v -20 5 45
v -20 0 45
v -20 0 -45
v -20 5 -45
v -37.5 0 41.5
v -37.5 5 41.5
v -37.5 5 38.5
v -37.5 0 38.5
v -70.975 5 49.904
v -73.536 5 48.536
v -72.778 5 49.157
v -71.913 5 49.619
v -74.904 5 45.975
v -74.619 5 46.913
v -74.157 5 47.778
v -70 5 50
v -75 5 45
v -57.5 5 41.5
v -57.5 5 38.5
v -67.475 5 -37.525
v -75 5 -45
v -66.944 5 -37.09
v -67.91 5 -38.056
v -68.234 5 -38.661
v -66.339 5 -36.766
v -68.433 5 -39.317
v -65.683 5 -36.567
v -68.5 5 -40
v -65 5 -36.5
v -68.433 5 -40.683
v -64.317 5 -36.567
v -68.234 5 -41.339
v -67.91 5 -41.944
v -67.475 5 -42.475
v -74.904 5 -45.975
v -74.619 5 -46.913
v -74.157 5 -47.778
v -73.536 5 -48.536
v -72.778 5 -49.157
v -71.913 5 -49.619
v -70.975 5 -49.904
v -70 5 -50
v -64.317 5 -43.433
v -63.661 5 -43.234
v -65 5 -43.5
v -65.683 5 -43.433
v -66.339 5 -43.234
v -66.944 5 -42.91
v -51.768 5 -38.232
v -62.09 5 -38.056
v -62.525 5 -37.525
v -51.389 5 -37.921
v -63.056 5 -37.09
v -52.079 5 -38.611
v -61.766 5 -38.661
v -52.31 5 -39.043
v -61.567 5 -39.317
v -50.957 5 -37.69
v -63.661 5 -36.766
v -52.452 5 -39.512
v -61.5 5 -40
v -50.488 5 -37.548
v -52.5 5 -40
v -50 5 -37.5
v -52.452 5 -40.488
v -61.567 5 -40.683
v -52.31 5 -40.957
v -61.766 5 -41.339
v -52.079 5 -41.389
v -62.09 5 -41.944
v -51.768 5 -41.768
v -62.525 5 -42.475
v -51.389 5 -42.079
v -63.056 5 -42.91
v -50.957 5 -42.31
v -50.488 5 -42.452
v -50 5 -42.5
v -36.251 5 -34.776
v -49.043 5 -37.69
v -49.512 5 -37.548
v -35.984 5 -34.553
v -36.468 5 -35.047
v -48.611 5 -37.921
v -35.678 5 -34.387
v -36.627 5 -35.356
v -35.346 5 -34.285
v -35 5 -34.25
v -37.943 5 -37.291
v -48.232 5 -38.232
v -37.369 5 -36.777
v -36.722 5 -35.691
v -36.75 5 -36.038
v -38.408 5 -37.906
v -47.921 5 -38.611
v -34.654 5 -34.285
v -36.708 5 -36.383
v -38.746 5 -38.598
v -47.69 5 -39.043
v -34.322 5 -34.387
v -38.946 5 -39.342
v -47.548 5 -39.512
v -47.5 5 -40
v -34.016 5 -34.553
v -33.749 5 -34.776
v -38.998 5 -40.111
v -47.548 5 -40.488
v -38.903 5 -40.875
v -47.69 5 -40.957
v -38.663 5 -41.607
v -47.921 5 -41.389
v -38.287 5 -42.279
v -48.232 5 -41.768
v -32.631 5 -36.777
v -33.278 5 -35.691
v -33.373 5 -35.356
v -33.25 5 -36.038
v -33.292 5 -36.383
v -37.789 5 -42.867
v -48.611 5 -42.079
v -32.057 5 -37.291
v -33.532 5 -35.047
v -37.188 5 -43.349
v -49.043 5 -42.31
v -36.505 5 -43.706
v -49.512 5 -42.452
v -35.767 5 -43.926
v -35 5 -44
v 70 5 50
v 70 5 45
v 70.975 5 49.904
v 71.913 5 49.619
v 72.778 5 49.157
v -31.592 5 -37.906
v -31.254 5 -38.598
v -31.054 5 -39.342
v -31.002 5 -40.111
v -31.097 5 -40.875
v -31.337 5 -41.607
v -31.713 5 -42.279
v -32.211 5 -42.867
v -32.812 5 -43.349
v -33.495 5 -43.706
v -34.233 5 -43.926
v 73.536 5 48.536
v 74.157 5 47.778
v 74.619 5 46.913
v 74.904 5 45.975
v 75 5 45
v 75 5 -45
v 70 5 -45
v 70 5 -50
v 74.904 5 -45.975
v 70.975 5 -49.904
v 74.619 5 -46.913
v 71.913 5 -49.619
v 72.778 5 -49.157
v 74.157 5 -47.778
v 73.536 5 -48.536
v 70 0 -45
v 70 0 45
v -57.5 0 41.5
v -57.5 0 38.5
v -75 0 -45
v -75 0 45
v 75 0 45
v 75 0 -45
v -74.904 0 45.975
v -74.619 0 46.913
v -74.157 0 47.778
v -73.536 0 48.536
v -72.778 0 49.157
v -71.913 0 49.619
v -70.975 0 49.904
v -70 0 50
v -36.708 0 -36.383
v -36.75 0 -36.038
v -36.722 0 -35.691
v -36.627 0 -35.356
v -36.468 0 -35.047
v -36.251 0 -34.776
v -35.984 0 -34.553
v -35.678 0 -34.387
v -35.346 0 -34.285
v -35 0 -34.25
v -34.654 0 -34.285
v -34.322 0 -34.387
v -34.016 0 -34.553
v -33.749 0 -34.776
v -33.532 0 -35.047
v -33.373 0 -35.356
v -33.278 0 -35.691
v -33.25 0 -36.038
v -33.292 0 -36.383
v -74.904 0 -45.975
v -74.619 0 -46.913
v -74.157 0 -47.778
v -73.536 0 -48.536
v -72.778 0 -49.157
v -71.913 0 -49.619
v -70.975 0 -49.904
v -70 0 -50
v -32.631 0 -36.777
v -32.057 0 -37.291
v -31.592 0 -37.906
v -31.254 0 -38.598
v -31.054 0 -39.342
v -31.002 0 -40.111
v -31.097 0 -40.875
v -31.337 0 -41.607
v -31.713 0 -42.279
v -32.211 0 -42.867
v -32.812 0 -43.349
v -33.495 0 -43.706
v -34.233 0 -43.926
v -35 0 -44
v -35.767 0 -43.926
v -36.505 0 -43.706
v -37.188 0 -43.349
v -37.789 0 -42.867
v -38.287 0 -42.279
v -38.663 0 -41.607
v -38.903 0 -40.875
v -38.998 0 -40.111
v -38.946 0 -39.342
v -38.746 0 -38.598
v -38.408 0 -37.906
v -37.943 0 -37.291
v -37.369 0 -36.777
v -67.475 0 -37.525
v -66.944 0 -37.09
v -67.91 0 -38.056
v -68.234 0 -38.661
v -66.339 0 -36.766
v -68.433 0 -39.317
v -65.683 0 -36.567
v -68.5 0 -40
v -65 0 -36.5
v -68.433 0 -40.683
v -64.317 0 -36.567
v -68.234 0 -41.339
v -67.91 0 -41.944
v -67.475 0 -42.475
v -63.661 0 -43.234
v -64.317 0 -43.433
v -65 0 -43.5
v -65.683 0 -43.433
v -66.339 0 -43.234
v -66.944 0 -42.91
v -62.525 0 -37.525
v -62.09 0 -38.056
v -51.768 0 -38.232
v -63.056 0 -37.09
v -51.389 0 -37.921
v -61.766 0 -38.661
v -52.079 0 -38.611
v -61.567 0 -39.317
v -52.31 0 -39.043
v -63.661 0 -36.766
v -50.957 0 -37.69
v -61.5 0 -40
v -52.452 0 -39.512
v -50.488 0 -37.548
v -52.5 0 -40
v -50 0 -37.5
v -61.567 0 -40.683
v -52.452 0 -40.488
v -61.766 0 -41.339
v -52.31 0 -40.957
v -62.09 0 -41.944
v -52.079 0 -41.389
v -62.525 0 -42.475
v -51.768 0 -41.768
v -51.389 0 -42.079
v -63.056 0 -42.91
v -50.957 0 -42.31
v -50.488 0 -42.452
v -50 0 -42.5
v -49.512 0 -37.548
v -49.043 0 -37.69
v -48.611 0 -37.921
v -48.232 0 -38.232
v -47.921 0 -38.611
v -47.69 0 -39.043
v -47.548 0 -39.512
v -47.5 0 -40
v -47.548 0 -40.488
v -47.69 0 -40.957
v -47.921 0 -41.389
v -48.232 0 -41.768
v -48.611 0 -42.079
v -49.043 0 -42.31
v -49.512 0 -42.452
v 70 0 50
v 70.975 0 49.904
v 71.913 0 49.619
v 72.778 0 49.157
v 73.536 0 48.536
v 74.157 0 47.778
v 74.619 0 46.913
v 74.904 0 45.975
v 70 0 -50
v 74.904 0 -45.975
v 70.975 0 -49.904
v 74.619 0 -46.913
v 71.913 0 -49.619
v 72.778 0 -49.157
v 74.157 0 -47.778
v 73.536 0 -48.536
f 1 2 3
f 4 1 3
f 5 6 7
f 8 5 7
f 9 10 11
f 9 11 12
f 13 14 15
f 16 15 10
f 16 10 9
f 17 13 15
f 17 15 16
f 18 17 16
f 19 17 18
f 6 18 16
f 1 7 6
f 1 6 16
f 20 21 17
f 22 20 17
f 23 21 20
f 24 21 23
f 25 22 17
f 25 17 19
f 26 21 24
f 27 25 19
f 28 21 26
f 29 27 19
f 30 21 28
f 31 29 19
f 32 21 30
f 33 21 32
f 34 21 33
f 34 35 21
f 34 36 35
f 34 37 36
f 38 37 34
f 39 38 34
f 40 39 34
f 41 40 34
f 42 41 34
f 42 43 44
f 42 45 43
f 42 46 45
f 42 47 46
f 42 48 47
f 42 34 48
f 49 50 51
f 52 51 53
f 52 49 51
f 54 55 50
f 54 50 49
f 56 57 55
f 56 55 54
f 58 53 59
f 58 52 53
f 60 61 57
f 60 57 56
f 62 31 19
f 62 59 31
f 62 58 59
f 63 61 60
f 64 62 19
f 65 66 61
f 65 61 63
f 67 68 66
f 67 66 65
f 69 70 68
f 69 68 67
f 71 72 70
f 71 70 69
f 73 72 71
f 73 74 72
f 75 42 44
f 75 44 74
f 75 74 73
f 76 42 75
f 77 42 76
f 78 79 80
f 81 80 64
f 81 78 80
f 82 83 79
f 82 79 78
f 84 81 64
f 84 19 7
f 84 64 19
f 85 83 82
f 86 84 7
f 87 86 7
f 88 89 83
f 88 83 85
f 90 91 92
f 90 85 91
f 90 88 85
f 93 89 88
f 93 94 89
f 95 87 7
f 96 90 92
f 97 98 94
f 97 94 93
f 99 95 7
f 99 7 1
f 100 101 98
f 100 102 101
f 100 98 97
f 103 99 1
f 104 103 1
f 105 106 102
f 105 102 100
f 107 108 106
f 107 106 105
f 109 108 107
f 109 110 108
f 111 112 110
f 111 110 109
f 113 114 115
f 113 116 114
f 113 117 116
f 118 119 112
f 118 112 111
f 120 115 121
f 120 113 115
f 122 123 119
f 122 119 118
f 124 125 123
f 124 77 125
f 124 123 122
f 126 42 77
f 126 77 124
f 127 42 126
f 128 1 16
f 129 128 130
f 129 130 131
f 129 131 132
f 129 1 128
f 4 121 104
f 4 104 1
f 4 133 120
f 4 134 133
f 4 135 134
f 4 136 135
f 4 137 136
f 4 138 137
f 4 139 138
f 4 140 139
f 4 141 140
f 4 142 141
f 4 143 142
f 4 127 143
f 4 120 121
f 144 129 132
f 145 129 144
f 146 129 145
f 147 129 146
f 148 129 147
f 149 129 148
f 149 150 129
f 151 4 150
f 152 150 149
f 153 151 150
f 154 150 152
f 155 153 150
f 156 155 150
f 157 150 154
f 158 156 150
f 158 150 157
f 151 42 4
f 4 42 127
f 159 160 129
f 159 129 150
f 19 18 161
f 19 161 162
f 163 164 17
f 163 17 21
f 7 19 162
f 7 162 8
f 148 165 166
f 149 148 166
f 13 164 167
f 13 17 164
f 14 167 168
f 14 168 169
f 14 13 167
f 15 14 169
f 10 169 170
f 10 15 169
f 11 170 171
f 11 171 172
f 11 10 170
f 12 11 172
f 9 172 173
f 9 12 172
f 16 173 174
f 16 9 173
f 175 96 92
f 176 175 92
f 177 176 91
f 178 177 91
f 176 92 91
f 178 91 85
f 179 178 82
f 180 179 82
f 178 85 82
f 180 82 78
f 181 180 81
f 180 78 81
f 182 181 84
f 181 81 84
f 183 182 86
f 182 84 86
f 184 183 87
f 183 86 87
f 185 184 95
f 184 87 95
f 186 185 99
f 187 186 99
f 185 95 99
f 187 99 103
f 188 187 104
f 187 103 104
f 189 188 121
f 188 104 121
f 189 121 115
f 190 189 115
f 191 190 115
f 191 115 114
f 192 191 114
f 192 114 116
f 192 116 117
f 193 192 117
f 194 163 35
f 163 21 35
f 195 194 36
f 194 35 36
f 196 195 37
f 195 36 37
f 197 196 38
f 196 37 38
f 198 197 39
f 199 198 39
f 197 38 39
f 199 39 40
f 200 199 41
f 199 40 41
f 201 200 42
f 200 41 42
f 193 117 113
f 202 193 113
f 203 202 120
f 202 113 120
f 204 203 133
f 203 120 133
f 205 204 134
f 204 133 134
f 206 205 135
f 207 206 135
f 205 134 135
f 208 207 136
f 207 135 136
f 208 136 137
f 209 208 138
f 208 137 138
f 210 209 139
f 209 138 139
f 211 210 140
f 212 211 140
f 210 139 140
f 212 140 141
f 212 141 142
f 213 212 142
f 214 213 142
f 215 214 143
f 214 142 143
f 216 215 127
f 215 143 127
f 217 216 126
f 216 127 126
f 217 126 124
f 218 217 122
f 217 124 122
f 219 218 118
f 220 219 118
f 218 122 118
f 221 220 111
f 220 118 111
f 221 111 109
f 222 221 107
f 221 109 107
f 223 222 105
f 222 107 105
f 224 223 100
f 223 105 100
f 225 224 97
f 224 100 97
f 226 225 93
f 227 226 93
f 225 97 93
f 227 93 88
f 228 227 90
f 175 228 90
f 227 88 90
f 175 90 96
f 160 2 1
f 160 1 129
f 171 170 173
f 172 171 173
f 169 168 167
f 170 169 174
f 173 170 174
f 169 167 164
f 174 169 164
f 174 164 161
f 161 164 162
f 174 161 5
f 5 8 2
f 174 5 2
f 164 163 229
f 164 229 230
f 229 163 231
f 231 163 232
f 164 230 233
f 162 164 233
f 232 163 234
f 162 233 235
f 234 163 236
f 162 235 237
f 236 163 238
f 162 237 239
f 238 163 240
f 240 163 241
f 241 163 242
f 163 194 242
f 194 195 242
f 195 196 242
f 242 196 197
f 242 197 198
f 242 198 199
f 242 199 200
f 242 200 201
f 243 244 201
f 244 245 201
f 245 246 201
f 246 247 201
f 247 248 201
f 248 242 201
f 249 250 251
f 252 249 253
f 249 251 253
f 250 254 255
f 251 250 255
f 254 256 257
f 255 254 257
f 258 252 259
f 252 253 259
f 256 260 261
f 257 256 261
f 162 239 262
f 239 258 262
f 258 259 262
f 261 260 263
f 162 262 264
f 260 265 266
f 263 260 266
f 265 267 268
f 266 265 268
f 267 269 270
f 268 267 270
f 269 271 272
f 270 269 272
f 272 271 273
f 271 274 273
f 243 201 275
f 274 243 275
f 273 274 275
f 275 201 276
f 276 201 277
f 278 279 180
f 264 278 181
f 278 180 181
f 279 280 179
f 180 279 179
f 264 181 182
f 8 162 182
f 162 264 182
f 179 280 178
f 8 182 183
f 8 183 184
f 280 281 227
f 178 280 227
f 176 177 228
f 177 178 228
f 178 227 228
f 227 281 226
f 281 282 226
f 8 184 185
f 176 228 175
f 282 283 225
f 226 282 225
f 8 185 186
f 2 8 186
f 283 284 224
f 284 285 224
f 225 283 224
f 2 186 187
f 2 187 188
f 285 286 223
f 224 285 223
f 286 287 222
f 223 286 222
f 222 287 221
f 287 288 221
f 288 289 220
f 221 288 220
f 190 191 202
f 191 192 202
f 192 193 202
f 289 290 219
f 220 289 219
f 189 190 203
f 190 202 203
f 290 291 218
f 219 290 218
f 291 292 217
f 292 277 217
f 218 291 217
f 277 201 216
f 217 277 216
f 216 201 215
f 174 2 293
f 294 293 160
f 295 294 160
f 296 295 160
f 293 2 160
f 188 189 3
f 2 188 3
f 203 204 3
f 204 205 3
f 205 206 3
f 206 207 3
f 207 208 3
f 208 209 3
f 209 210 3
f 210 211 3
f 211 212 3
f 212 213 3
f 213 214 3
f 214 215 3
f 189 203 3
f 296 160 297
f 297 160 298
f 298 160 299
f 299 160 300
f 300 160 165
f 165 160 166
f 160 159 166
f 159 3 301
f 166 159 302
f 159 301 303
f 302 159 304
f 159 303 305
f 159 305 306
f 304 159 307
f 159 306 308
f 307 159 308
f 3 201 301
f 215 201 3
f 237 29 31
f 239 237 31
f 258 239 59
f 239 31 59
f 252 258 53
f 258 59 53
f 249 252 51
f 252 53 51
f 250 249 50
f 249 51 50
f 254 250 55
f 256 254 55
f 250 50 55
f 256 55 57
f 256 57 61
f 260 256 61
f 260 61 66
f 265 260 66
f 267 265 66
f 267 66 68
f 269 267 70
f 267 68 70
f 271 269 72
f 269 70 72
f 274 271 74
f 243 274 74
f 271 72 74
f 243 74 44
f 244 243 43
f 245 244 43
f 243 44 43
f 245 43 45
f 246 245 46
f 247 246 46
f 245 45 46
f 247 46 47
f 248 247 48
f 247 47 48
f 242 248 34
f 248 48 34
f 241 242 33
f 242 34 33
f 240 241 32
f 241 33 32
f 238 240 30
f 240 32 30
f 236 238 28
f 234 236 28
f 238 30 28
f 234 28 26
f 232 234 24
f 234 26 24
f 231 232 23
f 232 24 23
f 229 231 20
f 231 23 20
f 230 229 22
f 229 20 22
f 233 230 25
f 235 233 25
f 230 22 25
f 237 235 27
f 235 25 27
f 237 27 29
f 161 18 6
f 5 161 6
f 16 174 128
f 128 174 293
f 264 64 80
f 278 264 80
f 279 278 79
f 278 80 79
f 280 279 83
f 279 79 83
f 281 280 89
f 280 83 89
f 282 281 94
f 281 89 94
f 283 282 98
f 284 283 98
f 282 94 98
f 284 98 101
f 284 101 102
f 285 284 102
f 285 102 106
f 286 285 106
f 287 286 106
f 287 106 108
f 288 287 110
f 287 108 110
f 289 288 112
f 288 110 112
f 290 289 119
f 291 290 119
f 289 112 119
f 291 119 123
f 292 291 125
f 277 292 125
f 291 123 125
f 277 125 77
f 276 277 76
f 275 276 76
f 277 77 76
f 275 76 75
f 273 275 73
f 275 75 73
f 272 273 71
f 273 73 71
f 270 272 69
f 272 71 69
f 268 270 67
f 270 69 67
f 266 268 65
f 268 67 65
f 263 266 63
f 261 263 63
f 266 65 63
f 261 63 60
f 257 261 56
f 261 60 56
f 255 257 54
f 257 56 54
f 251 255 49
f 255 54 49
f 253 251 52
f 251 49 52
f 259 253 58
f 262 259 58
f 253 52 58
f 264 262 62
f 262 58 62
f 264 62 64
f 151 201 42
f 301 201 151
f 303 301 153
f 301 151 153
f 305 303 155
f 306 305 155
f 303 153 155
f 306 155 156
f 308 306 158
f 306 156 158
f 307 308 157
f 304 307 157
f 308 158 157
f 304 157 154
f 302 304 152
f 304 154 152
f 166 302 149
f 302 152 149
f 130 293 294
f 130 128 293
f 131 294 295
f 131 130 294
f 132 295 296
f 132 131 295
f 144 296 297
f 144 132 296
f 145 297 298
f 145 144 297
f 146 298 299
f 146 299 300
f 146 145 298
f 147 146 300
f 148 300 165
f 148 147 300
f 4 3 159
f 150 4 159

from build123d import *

# Parameters (mm, degrees)
SKETCH1_W           = 150
SKETCH1_H           = 100
SKETCH1_W_2         = 90
SKETCH1_H_2         = 90
BOSS_EXTRUDE1_DEPTH = 5
FILLET1_R           = 5
SKETCH2_R           = 3.5
SKETCH2_R_2         = 2.5
SKETCH2_R_3         = 1.75
SKETCH2_R_4         = 4
SKETCH2_W           = 20
SKETCH2_H           = 3
CUT_EXTRUDE3_DEPTH  = 5


with BuildPart() as part:
    # Sketch1 → Boss-Extrude1 (new body)
    with BuildSketch(Plane(origin=(0, 0, 0), x_dir=(1, 0, 0), z_dir=(0, 1, 0))):
        Rectangle(SKETCH1_W, SKETCH1_H)
        with Locations((25, 0)):
            Rectangle(SKETCH1_W_2, SKETCH1_H_2, mode=Mode.SUBTRACT)
    extrude(amount=BOSS_EXTRUDE1_DEPTH)

    # Fillet1
    fillet1_edges = [part.edges().sort_by_distance(p)[0] for p in [
        (75, 2.5, 50),
        (-75, 2.5, 50),
        (-75, 2.5, -50),
        (75, 2.5, -50),
    ]]
    fillet(fillet1_edges, radius=FILLET1_R)

    # Sketch2 → Cut-Extrude3 (cut)
    with BuildSketch(Plane(origin=(0, 5, 0), x_dir=(1, 0, 0), z_dir=(0, 1, 0))):
        with Locations(Location((-65, 40, 0), (0, 0, 270))):
            Circle(SKETCH2_R)
        with Locations(Location((-50, 40, 0), (0, 0, 270))):
            Circle(SKETCH2_R_2)
        with Locations((-35, 36)):
            Circle(SKETCH2_R_3)
        with Locations((-35, 40)):
            Circle(SKETCH2_R_4)
        with Locations((-47.5, -40)):
            Rectangle(SKETCH2_W, SKETCH2_H)
    extrude(amount=-CUT_EXTRUDE3_DEPTH, mode=Mode.SUBTRACT)


solid = part.part
